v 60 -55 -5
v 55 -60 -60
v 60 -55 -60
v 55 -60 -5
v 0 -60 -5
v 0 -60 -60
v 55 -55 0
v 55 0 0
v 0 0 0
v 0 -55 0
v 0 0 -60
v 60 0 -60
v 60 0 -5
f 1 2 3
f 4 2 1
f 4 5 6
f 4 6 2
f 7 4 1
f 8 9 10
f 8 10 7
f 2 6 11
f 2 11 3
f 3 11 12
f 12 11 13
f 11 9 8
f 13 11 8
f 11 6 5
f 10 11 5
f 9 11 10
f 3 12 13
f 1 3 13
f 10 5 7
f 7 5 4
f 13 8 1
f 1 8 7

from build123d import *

# Parameters (mm, degrees)
F0_W     = 60
F0_H     = 60
F1_DEPTH = 60
F2_SIZE  = 5


with BuildPart() as f1:
    # F0 (on Front) → F1 (new body)
    with BuildSketch(Plane.XZ):
        with Locations((30, -30)):
            Rectangle(F0_W, F0_H)
    extrude(amount=F1_DEPTH)

    # F2
    f2_edges = [f1.edges().sort_by_distance(p)[0] for p in [
        (60, -60, -30),
        (30, -60, 0),
        (60, -30, 0),
    ]]
    chamfer(f2_edges, length=F2_SIZE)


solid = f1.part
